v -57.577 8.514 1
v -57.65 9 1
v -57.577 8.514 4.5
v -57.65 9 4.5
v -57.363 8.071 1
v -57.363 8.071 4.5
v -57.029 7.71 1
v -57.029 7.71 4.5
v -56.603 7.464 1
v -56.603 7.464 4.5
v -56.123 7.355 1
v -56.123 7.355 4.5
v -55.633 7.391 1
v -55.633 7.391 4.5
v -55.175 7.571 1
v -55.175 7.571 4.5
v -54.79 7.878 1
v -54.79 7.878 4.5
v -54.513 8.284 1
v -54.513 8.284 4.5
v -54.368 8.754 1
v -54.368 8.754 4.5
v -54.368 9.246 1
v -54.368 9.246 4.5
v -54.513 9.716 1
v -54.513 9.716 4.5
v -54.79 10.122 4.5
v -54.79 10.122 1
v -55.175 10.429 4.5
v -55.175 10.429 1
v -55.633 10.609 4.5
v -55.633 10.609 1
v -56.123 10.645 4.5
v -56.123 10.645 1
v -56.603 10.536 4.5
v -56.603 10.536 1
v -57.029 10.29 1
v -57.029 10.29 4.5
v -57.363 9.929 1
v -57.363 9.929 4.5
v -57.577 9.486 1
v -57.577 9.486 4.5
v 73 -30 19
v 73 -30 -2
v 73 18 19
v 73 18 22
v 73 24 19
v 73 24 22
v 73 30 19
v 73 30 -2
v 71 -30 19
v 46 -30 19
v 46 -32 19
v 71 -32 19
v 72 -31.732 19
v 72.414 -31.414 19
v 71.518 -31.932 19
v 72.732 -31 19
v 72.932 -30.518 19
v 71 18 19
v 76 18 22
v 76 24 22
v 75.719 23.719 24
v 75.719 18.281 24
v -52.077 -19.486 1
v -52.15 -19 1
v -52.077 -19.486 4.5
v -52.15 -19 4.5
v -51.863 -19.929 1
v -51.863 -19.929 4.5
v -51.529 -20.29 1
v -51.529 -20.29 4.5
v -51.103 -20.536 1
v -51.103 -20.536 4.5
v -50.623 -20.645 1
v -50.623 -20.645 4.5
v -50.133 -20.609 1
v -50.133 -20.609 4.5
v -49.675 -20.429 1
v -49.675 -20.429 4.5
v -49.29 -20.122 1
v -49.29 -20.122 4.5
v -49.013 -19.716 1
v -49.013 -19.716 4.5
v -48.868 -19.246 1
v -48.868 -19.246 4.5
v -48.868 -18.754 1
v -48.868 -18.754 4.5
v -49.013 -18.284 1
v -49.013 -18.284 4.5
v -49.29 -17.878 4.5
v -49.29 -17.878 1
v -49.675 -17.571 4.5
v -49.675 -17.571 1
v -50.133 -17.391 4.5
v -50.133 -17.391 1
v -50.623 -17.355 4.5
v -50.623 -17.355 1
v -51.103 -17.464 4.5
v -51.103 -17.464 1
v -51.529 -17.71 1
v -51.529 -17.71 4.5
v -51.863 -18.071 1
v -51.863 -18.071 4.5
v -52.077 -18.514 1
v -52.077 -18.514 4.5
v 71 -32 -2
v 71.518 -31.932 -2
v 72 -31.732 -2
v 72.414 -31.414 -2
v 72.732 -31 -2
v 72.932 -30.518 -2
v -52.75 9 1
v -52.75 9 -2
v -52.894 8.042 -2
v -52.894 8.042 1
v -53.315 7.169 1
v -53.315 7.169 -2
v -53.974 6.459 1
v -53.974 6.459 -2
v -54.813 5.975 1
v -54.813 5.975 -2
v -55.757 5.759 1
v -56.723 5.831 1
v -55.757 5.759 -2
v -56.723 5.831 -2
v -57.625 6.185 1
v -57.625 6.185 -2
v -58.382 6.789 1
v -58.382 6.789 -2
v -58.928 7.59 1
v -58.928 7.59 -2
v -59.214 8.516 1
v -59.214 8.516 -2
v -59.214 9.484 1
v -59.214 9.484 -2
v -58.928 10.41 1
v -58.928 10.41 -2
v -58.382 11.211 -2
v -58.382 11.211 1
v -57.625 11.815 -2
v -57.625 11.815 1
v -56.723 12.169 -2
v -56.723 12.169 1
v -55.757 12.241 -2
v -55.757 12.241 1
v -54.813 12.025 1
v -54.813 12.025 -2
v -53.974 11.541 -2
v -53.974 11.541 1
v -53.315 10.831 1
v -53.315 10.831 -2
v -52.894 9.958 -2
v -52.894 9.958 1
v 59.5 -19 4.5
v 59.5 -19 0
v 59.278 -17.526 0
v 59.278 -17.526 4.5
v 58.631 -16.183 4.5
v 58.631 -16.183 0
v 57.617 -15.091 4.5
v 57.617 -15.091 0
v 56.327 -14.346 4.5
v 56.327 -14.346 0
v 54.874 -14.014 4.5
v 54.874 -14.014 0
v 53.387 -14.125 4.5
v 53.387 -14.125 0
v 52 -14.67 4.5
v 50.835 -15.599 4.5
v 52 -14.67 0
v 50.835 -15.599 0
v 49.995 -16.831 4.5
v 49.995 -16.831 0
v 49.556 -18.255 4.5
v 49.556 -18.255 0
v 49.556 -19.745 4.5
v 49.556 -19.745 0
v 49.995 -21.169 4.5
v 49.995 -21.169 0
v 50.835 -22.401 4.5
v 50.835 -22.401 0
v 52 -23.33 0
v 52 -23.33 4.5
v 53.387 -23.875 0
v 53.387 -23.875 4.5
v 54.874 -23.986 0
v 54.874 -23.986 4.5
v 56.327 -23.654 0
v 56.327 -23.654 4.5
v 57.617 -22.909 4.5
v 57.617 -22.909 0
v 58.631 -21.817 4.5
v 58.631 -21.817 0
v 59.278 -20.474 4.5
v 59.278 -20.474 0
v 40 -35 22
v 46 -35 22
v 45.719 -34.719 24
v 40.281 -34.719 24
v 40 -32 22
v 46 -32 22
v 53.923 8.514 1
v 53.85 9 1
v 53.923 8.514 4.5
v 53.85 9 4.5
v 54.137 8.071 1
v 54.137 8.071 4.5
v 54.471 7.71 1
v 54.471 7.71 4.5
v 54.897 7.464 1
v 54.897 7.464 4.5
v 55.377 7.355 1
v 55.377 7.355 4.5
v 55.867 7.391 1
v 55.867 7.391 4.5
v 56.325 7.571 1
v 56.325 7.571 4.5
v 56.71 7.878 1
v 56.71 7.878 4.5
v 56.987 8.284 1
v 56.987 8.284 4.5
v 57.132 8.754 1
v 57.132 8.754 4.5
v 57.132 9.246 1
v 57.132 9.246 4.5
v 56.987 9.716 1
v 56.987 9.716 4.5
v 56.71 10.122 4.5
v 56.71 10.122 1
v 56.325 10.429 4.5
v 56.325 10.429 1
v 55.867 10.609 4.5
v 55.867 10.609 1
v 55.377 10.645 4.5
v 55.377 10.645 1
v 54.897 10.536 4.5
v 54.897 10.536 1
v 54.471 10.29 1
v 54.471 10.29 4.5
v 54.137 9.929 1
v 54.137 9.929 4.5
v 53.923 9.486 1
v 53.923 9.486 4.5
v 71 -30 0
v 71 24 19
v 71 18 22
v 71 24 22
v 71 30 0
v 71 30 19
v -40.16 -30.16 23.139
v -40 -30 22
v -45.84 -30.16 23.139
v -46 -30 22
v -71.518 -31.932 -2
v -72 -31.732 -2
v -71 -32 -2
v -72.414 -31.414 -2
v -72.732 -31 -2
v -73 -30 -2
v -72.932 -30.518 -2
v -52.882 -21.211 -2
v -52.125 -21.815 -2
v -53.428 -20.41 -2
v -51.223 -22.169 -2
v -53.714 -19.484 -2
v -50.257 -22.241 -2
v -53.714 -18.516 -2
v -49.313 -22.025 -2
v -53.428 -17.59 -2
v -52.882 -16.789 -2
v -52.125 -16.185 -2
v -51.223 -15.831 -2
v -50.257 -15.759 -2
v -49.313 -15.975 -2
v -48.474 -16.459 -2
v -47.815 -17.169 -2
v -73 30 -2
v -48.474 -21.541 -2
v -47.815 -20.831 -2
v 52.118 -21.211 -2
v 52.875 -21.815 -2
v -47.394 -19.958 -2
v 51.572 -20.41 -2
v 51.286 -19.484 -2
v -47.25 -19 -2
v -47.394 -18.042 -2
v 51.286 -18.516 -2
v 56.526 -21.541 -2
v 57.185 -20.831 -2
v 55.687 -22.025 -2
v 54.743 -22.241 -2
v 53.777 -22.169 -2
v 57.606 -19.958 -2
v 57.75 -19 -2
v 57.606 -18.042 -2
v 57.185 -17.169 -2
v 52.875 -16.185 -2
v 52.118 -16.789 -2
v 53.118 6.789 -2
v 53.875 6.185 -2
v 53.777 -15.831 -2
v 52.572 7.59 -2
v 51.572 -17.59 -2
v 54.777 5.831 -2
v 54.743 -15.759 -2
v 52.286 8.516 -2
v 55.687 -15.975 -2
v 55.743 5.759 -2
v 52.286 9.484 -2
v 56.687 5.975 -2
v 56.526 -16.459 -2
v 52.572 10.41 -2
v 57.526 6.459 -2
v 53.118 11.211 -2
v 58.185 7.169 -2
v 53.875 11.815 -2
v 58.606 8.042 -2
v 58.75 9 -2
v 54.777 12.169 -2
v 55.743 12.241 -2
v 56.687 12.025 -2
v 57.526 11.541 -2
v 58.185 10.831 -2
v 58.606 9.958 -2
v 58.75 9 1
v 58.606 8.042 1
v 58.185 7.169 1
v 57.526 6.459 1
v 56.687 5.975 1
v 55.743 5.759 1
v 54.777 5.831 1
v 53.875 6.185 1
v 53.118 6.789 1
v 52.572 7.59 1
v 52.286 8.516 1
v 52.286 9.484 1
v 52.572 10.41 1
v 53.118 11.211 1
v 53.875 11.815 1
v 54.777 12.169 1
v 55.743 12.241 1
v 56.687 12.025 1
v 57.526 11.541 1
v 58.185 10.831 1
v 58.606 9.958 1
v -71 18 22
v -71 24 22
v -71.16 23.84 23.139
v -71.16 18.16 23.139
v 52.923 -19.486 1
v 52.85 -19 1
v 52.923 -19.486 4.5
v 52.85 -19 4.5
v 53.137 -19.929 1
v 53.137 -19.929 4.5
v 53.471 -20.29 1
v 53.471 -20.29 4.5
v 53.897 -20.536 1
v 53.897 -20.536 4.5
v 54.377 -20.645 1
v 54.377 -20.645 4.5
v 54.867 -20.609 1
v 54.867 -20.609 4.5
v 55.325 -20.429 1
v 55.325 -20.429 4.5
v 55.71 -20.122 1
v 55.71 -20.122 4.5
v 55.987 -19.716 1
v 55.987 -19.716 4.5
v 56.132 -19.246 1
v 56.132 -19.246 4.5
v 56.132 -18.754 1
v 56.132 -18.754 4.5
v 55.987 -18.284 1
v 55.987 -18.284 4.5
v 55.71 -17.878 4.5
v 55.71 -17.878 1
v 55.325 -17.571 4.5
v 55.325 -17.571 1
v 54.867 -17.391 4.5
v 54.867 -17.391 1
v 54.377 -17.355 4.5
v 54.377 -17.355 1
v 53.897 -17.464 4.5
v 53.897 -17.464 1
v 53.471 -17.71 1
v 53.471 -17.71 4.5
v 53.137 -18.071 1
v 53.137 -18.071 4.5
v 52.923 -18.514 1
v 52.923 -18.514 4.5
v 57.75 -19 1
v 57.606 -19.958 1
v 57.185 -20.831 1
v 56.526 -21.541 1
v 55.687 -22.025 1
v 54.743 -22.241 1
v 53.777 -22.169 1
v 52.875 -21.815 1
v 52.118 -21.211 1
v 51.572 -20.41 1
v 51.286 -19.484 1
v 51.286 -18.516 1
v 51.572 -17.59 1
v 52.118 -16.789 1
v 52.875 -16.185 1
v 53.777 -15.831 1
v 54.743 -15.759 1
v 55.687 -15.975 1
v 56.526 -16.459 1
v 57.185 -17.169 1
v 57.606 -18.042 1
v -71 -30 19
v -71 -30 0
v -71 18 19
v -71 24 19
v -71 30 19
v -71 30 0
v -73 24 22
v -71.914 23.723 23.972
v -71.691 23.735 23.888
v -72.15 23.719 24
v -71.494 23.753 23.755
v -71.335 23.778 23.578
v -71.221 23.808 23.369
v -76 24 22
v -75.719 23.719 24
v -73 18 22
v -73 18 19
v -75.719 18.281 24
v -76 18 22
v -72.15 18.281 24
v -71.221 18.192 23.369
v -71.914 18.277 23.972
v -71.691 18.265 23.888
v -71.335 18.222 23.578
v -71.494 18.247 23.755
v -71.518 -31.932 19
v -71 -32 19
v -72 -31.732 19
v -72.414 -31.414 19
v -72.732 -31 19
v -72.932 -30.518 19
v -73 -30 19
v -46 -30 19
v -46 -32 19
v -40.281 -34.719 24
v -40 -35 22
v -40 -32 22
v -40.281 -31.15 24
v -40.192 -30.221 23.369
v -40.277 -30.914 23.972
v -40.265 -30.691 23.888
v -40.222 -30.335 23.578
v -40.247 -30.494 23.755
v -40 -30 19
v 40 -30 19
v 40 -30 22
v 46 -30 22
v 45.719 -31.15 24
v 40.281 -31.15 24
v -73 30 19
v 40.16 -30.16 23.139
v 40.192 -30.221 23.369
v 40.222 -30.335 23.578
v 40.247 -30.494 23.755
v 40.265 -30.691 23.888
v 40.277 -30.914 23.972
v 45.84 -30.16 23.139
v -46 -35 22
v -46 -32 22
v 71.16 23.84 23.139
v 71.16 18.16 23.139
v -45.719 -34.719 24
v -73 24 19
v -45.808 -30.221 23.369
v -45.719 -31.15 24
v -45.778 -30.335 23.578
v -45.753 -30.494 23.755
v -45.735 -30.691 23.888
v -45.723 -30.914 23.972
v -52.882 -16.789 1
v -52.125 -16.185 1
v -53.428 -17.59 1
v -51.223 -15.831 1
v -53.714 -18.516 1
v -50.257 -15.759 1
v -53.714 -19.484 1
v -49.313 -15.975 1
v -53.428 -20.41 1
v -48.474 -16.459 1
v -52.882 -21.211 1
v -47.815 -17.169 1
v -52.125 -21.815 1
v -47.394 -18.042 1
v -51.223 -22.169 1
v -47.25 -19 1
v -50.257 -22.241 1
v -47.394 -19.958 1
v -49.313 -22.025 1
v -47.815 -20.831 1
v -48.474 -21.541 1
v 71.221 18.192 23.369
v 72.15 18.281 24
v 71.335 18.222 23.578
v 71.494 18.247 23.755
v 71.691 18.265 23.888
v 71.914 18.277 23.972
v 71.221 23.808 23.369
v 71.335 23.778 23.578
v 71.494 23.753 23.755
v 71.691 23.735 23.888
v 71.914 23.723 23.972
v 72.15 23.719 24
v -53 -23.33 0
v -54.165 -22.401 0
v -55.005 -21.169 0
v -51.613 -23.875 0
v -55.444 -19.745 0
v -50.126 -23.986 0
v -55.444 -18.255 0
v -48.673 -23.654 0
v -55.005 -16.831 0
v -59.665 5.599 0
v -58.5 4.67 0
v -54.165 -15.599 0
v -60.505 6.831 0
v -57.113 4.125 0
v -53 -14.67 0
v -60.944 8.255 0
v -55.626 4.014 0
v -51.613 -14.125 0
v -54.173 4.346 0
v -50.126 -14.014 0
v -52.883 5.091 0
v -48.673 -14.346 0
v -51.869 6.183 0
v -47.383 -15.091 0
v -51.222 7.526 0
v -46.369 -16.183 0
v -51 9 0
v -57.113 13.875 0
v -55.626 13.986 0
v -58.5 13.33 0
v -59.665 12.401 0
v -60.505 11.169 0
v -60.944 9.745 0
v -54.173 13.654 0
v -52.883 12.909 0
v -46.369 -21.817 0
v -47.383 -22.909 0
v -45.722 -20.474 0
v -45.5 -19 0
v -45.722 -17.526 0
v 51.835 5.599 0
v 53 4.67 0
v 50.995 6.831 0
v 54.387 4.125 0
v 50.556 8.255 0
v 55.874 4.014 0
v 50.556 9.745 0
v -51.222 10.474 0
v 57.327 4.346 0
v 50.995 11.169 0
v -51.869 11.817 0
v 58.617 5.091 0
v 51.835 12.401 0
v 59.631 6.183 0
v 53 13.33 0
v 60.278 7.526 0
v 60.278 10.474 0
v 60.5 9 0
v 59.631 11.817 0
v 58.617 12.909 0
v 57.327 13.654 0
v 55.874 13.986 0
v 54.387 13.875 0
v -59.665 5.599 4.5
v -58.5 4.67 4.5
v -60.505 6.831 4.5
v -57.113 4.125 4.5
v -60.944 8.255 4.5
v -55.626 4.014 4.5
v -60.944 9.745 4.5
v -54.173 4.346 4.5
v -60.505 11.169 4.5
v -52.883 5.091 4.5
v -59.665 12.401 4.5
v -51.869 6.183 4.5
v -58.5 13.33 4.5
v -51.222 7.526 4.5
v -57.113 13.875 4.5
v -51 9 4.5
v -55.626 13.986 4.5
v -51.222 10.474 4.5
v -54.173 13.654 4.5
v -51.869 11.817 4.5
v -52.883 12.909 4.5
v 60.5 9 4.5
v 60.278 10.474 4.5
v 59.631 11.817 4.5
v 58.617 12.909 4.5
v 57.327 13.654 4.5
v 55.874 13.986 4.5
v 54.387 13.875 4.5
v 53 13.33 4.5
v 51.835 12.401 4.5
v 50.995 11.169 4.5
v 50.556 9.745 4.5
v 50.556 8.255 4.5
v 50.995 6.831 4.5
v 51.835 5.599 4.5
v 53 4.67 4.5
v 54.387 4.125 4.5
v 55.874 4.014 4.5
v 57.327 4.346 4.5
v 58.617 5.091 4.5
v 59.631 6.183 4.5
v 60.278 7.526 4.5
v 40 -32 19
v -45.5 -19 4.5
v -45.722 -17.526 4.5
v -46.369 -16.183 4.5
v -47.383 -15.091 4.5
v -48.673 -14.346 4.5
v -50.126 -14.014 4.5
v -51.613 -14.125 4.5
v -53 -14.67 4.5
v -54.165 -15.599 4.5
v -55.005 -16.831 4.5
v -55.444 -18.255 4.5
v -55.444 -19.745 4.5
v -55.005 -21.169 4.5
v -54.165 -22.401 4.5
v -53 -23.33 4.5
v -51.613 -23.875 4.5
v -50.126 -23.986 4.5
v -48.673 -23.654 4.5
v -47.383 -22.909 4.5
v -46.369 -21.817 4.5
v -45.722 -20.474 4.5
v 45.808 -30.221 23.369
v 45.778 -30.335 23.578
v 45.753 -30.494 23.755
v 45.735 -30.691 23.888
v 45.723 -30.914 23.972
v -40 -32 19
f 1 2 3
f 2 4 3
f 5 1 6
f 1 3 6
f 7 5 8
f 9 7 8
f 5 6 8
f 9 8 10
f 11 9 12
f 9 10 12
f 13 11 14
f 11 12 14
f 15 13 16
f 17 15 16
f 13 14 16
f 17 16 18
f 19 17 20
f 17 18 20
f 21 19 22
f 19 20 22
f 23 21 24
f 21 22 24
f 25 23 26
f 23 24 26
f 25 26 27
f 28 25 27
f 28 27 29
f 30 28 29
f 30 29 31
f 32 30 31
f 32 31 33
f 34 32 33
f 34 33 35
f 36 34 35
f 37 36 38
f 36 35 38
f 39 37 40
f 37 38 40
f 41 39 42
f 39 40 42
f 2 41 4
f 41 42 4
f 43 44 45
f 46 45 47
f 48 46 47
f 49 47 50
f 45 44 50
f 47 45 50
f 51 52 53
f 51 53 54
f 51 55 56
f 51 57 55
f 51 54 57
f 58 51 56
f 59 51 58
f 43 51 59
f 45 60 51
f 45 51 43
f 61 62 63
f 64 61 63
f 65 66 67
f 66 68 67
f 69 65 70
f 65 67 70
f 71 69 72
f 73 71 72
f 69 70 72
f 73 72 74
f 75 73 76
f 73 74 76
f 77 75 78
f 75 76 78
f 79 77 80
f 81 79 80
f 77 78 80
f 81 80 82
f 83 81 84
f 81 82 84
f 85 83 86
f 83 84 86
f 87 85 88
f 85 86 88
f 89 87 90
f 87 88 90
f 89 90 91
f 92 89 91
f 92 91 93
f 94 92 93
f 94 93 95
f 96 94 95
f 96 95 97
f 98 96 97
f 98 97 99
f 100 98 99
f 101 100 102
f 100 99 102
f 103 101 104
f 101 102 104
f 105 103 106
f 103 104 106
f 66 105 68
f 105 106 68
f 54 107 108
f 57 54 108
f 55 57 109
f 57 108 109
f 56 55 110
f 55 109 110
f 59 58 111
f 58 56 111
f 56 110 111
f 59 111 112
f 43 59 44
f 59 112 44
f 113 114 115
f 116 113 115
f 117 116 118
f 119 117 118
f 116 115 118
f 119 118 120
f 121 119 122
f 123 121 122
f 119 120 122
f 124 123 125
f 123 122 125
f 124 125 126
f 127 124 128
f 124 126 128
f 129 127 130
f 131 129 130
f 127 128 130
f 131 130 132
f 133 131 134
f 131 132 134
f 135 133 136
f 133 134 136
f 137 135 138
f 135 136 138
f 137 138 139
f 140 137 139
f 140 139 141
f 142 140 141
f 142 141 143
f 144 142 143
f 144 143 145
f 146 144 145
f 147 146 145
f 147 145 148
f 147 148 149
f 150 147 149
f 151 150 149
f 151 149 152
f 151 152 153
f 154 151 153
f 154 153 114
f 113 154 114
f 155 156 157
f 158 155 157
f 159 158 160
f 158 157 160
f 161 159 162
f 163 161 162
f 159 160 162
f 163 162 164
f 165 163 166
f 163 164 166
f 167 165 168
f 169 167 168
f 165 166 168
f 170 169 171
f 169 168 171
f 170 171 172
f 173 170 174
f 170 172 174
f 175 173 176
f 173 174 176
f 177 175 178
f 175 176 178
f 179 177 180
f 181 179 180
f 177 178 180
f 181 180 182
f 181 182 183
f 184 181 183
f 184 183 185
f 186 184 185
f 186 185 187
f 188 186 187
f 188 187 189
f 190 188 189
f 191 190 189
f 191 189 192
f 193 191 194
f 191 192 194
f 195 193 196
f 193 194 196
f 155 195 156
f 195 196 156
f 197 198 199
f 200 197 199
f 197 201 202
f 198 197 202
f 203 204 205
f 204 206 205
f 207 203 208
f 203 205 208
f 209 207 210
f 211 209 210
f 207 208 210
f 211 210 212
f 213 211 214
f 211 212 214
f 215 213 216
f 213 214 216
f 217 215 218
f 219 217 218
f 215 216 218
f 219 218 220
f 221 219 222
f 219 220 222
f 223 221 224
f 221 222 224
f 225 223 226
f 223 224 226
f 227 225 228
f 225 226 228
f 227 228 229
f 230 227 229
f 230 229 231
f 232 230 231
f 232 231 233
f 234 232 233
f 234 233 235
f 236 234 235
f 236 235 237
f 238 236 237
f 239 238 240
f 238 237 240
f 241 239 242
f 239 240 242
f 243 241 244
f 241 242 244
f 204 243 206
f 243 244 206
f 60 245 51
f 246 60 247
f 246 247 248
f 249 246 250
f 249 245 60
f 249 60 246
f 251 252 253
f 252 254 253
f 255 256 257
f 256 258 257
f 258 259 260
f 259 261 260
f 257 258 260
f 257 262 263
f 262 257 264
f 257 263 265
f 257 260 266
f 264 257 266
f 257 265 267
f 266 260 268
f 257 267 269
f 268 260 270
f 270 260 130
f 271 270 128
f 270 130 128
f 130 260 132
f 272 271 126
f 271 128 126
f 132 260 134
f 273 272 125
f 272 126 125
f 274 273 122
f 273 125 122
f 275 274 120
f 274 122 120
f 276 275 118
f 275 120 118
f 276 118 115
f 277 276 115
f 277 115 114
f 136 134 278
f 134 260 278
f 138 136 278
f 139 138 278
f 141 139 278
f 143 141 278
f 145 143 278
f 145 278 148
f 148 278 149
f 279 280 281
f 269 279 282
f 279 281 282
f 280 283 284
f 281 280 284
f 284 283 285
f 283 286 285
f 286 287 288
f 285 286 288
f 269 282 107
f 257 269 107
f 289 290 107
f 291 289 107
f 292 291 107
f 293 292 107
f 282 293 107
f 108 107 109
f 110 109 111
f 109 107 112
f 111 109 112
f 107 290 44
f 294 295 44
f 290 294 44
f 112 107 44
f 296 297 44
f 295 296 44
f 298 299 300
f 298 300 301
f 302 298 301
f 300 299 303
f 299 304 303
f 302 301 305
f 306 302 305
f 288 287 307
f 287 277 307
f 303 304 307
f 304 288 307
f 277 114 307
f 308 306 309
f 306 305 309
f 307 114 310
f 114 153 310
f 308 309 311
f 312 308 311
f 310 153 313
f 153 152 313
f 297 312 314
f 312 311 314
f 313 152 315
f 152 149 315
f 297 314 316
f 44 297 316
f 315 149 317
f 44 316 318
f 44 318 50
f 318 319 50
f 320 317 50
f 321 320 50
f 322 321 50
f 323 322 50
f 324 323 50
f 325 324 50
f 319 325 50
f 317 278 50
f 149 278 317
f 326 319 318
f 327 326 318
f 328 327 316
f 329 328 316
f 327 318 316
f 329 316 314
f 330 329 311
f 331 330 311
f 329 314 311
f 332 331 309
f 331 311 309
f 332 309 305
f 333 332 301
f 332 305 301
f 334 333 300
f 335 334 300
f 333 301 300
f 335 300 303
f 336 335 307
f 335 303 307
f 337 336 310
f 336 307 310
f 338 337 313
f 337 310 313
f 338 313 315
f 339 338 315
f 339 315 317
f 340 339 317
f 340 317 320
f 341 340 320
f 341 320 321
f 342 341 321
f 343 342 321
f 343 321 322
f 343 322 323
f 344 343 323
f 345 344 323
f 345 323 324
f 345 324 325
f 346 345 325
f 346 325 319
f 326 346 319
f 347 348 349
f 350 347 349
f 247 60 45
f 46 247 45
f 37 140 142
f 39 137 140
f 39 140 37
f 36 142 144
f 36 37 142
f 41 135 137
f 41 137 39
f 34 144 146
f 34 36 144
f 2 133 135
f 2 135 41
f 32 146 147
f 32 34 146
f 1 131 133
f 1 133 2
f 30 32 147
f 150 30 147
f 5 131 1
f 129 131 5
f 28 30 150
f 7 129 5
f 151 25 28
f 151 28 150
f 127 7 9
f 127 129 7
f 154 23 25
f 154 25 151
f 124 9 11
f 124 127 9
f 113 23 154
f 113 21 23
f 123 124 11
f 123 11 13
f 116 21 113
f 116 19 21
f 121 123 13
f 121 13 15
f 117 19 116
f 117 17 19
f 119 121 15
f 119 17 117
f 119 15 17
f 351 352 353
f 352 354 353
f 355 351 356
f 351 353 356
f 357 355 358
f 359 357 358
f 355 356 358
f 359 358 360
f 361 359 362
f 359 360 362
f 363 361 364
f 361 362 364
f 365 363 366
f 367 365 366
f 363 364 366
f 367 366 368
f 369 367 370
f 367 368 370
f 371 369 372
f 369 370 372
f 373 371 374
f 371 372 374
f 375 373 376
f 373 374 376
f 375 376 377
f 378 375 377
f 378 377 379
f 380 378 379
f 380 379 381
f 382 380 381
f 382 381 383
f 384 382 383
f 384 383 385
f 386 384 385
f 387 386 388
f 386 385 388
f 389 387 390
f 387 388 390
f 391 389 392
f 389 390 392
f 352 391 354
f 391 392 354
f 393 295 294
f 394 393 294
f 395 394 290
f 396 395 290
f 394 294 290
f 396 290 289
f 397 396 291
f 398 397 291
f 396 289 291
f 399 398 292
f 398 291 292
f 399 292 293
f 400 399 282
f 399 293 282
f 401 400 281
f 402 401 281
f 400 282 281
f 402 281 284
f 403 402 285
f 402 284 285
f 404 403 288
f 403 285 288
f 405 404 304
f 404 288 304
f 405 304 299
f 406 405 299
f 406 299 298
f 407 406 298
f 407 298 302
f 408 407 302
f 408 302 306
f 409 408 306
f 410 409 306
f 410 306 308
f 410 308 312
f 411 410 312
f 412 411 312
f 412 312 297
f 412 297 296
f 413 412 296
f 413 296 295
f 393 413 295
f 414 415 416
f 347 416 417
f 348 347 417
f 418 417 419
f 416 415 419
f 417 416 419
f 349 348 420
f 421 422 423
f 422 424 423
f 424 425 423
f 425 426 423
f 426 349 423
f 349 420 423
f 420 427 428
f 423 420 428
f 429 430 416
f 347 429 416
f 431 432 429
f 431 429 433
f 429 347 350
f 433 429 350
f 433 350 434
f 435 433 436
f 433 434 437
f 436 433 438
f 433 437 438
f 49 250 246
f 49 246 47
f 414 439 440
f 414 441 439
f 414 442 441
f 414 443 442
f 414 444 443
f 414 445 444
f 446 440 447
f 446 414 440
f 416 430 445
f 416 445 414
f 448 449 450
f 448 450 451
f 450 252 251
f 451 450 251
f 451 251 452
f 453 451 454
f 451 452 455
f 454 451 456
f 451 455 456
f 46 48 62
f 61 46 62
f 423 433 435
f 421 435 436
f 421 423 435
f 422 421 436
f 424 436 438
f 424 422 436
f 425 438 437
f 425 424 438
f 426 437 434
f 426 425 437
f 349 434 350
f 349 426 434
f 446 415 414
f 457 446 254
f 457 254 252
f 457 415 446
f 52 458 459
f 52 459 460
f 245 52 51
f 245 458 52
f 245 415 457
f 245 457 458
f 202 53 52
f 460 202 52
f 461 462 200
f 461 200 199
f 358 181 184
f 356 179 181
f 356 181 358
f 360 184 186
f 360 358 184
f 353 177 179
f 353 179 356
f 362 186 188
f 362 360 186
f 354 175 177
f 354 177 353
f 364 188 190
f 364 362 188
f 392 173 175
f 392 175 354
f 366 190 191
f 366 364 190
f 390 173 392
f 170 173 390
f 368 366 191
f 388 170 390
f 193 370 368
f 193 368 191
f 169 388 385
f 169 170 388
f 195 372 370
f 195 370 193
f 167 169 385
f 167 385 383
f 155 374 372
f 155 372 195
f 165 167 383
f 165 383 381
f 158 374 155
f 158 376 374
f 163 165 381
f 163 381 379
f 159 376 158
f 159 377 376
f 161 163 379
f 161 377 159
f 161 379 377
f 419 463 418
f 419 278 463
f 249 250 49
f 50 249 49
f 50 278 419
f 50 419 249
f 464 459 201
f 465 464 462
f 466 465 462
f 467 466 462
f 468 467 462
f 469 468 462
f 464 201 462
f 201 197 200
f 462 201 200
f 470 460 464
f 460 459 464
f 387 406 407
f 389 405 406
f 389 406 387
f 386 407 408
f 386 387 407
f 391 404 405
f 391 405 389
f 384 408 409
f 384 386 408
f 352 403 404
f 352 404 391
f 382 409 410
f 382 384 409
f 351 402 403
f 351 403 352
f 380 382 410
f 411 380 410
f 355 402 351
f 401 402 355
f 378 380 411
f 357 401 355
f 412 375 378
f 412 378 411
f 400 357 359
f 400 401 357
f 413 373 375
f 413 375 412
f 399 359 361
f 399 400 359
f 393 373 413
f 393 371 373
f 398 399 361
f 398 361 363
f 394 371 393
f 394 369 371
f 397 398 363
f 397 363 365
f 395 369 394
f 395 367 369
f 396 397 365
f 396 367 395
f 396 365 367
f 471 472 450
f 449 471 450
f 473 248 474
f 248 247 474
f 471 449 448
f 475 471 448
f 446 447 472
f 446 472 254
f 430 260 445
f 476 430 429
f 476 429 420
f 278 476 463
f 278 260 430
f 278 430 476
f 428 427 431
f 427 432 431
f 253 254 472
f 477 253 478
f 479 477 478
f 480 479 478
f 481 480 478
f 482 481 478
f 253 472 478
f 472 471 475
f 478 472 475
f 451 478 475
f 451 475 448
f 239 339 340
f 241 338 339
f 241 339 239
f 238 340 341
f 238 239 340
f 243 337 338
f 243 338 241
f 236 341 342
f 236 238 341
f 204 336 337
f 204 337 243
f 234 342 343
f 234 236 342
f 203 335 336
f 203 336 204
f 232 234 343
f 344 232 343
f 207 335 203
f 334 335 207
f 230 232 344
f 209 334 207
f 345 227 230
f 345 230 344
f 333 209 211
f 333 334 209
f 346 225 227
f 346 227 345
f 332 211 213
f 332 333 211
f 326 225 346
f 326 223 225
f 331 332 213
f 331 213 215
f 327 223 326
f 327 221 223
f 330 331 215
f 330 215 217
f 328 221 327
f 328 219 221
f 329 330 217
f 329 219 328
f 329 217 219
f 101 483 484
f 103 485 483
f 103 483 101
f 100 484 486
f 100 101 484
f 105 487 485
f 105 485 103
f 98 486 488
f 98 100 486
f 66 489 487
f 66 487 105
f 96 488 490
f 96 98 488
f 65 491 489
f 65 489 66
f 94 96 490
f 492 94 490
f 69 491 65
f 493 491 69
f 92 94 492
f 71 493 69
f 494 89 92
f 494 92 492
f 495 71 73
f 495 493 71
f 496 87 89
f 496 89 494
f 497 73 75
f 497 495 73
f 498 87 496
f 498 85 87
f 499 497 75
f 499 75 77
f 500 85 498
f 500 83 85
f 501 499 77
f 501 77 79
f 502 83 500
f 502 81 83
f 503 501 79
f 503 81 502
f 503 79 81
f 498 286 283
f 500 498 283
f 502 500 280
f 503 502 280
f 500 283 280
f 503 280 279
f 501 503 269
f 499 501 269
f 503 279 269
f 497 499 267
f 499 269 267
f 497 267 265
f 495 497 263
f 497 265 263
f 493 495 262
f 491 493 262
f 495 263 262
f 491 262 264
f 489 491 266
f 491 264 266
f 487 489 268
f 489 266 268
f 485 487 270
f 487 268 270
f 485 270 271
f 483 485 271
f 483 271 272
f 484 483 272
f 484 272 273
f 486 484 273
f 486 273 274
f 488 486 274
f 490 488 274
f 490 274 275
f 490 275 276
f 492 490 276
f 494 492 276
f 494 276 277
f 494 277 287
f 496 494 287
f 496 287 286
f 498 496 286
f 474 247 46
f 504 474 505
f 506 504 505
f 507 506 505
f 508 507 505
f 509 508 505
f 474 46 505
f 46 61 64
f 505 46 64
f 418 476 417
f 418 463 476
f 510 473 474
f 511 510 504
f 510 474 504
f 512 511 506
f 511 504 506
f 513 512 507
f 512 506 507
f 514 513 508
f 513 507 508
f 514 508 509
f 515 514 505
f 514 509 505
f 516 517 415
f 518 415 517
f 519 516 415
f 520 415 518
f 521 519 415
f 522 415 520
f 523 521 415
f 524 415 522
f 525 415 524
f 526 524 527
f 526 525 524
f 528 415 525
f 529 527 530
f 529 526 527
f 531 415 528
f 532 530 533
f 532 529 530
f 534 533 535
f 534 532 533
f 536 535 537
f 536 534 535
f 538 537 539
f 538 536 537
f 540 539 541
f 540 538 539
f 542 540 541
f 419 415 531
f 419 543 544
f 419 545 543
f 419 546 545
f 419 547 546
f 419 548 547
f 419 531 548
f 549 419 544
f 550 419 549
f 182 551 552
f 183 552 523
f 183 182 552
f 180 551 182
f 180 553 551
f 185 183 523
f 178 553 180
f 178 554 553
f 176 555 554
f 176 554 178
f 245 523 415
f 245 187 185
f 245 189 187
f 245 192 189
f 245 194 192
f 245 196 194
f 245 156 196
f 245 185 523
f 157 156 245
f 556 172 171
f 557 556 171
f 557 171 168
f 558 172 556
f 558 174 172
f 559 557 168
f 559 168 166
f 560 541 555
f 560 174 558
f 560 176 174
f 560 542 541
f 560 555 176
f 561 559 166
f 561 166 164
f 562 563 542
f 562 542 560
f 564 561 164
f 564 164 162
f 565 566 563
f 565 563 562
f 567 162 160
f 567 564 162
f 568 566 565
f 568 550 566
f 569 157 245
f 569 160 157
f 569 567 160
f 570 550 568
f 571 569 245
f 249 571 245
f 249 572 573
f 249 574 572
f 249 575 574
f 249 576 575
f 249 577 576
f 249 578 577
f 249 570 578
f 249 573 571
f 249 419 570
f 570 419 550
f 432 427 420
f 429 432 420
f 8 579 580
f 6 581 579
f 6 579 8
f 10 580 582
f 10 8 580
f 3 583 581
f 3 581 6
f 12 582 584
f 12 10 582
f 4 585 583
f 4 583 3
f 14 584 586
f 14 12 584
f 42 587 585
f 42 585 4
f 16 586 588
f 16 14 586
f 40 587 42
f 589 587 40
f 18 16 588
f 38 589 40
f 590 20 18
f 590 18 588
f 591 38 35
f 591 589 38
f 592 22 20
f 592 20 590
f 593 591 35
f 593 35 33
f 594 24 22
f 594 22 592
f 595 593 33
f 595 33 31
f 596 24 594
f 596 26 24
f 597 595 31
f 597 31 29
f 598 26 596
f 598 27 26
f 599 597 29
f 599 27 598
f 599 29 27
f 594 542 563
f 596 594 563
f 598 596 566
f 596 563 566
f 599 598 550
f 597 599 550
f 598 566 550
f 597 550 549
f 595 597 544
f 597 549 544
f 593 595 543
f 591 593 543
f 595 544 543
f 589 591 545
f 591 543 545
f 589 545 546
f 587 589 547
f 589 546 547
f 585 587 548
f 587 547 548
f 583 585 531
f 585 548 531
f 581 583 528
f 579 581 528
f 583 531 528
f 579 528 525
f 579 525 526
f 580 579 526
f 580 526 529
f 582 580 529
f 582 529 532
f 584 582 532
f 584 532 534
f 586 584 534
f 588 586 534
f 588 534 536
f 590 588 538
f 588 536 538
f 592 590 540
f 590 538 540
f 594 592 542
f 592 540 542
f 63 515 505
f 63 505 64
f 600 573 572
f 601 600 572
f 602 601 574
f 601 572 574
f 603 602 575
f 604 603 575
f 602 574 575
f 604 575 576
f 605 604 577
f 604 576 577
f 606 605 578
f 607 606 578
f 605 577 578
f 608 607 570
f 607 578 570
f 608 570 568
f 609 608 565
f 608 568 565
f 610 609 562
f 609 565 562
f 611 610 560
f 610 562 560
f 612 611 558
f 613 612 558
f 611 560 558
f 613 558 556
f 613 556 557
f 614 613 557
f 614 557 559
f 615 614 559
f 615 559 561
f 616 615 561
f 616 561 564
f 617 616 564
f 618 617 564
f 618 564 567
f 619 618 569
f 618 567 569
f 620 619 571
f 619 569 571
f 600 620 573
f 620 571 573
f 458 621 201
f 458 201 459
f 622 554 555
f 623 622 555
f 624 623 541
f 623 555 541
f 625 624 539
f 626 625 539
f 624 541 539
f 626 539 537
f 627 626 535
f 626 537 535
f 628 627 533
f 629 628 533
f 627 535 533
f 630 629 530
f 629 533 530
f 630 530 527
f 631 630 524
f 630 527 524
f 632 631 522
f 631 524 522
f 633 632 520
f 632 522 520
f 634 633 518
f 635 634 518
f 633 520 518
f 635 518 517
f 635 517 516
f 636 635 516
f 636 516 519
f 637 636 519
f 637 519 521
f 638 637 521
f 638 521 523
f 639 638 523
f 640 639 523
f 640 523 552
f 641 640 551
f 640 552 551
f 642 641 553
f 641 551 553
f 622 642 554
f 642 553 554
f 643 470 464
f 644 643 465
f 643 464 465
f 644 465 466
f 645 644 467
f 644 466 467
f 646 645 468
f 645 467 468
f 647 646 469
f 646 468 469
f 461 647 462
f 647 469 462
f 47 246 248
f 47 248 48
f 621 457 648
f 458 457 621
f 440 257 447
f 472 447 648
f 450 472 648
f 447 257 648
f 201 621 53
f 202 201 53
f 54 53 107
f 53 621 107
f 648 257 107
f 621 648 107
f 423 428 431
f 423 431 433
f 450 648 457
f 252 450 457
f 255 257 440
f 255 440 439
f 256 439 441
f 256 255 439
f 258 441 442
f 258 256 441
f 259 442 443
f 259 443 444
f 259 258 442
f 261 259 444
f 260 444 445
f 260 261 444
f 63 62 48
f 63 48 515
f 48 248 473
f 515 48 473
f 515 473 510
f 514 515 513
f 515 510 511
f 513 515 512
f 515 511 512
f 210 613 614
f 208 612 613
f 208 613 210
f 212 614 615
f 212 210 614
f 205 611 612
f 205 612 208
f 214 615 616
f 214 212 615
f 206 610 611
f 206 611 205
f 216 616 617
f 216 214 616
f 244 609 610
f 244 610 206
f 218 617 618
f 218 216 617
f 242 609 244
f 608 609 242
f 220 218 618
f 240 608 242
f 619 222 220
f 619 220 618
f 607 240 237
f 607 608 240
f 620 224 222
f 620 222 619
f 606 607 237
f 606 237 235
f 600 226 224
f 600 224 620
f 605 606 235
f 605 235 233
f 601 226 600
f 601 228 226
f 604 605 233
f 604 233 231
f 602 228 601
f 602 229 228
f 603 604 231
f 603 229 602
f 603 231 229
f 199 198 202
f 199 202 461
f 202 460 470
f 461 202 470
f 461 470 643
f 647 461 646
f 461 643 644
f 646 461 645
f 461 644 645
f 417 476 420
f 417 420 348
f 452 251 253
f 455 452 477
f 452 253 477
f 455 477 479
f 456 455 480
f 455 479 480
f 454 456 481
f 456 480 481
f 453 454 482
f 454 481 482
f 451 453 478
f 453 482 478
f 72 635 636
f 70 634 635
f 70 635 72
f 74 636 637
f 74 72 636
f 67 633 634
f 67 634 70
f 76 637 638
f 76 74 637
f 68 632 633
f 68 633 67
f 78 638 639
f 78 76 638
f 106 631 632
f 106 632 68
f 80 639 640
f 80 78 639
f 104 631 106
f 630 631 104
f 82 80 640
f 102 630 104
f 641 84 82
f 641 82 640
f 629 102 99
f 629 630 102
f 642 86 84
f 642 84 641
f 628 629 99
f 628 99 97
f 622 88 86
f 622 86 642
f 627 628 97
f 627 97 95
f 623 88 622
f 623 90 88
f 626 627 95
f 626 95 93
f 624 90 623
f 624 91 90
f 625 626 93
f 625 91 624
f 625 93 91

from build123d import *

# Parameters (mm, degrees)
F0_W            = 142
F0_H            = 60
F0_R            = 5
F1_DEPTH        = 19
F2_T            = 2
F3_T1_DEPTH     = 31
F4_W            = 6
F4_H            = 2
F4_W_2          = 2
F4_H_2          = 6
F5_DEPTH        = 3
F6_W            = 5
F6_H            = 6
F6_W_2          = 6
F6_H_2          = 5
F7_DEPTH        = 2
F7_TAPER        = 8
F8_R            = 1
F9_DEPTH        = 4.5
F11_D           = 3.3
F11_CBORE_D     = 6.5
F11_CBORE_DEPTH = 3


# Not quite as in the source:
# - a fillet or chamfer that OpenCascade refuses, or shapes differently, is made with other operations: its cross-section is extruded or revolved along the edge and cut away or added
# - a feature names something its author has since deleted; it is built from what else it names


with BuildPart() as f1:
    # F0 (on Top) → F1 (new body)
    with BuildSketch(Plane.XY):
        Rectangle(F0_W, F0_H)
        with Locations((-50.5, -19)):
            Circle(F0_R, mode=Mode.SUBTRACT)
        with Locations((54.5, -19)):
            Circle(F0_R, mode=Mode.SUBTRACT)
        with Locations((-56, 9)):
            Circle(F0_R, mode=Mode.SUBTRACT)
        with Locations((55.5, 9)):
            Circle(F0_R, mode=Mode.SUBTRACT)
        with Locations((-56, 9)):
            Circle(F0_R)
        with Locations((-50.5, -19)):
            Circle(F0_R)
        with Locations((54.5, -19)):
            Circle(F0_R)
        with Locations((55.5, 9)):
            Circle(F0_R)
    extrude(amount=F1_DEPTH)

    # F2
    f2_openings = [f1.faces().sort_by_distance(p)[0] for p in [
        (0, 0, 19),
        (0, 30, 9.5),
    ]]
    offset(amount=F2_T, openings=f2_openings, kind=Kind.INTERSECTION)

    # F3: fillet of radius 2 on 2 edges, made by hand

    # F3_s2 → F3_t1 (cut)
    with BuildSketch(Plane.XY.offset(-7)):
        with BuildLine():
            ThreePointArc((-71, -32), (-72.4142135624, -31.4142135624), (-73, -30))
            Line((-73, -30), (-73, -32))
            Line((-73, -32), (-71, -32))
        make_face()
        with BuildLine():
            ThreePointArc((71, -32), (72.4142135624, -31.4142135624), (73, -30))
            Line((73, -30), (73, -32))
            Line((73, -32), (71, -32))
        make_face()
    extrude(amount=F3_T1_DEPTH, mode=Mode.SUBTRACT)

    # F4 (on face) → F5 (join)
    with BuildSketch(Plane.XY.offset(19)):
        with Locations((-43, -31)):
            Rectangle(F4_W, F4_H)
        with Locations((-72, 21)):
            Rectangle(F4_W_2, F4_H_2)
        with Locations((72, 21)):
            Rectangle(F4_W_2, F4_H_2)
        with Locations((43, -31)):
            Rectangle(F4_W, F4_H)
    extrude(amount=F5_DEPTH)

    # F6 (on face) → F7 (join)
    with BuildSketch(Plane.XY.offset(22)):
        with Locations((-73.5, 21)):
            Rectangle(F6_W, F6_H)
        with Locations((-43, -32.5)):
            Rectangle(F6_W_2, F6_H_2)
        with Locations((43, -32.5)):
            Rectangle(F6_W_2, F6_H_2)
        with Locations((73.5, 21)):
            Rectangle(F6_W, F6_H)
    extrude(amount=F7_DEPTH, taper=F7_TAPER)

    # F8
    f8_edges = [f1.edges().sort_by_distance(p)[0] for p in [
        (-71.281082, 21, 24),
        (-43, -30.281082, 24),
        (43, -30.281082, 24),
        (71.281082, 21, 24),
    ]]
    fillet(f8_edges, radius=F8_R)

    # F0 (on Top) → F9 (join)
    with BuildSketch(Plane.XY):
        with Locations((-56, 9)):
            Circle(F0_R)
        with Locations((55.5, 9)):
            Circle(F0_R)
        with Locations((54.5, -19)):
            Circle(F0_R)
        with Locations((-50.5, -19)):
            Circle(F0_R)
    extrude(amount=F9_DEPTH)

    # F11 (through all)
    with Locations(Plane(origin=(0, 0, -2), x_dir=(1, 0, 0), z_dir=(0, 0, -1))):
        with Locations((-50.5, 19), (-56, -9), (55.5, -9), (54.5, 19)):
            CounterBoreHole(F11_D / 2, F11_CBORE_D / 2, F11_CBORE_DEPTH)


solid = f1.part
